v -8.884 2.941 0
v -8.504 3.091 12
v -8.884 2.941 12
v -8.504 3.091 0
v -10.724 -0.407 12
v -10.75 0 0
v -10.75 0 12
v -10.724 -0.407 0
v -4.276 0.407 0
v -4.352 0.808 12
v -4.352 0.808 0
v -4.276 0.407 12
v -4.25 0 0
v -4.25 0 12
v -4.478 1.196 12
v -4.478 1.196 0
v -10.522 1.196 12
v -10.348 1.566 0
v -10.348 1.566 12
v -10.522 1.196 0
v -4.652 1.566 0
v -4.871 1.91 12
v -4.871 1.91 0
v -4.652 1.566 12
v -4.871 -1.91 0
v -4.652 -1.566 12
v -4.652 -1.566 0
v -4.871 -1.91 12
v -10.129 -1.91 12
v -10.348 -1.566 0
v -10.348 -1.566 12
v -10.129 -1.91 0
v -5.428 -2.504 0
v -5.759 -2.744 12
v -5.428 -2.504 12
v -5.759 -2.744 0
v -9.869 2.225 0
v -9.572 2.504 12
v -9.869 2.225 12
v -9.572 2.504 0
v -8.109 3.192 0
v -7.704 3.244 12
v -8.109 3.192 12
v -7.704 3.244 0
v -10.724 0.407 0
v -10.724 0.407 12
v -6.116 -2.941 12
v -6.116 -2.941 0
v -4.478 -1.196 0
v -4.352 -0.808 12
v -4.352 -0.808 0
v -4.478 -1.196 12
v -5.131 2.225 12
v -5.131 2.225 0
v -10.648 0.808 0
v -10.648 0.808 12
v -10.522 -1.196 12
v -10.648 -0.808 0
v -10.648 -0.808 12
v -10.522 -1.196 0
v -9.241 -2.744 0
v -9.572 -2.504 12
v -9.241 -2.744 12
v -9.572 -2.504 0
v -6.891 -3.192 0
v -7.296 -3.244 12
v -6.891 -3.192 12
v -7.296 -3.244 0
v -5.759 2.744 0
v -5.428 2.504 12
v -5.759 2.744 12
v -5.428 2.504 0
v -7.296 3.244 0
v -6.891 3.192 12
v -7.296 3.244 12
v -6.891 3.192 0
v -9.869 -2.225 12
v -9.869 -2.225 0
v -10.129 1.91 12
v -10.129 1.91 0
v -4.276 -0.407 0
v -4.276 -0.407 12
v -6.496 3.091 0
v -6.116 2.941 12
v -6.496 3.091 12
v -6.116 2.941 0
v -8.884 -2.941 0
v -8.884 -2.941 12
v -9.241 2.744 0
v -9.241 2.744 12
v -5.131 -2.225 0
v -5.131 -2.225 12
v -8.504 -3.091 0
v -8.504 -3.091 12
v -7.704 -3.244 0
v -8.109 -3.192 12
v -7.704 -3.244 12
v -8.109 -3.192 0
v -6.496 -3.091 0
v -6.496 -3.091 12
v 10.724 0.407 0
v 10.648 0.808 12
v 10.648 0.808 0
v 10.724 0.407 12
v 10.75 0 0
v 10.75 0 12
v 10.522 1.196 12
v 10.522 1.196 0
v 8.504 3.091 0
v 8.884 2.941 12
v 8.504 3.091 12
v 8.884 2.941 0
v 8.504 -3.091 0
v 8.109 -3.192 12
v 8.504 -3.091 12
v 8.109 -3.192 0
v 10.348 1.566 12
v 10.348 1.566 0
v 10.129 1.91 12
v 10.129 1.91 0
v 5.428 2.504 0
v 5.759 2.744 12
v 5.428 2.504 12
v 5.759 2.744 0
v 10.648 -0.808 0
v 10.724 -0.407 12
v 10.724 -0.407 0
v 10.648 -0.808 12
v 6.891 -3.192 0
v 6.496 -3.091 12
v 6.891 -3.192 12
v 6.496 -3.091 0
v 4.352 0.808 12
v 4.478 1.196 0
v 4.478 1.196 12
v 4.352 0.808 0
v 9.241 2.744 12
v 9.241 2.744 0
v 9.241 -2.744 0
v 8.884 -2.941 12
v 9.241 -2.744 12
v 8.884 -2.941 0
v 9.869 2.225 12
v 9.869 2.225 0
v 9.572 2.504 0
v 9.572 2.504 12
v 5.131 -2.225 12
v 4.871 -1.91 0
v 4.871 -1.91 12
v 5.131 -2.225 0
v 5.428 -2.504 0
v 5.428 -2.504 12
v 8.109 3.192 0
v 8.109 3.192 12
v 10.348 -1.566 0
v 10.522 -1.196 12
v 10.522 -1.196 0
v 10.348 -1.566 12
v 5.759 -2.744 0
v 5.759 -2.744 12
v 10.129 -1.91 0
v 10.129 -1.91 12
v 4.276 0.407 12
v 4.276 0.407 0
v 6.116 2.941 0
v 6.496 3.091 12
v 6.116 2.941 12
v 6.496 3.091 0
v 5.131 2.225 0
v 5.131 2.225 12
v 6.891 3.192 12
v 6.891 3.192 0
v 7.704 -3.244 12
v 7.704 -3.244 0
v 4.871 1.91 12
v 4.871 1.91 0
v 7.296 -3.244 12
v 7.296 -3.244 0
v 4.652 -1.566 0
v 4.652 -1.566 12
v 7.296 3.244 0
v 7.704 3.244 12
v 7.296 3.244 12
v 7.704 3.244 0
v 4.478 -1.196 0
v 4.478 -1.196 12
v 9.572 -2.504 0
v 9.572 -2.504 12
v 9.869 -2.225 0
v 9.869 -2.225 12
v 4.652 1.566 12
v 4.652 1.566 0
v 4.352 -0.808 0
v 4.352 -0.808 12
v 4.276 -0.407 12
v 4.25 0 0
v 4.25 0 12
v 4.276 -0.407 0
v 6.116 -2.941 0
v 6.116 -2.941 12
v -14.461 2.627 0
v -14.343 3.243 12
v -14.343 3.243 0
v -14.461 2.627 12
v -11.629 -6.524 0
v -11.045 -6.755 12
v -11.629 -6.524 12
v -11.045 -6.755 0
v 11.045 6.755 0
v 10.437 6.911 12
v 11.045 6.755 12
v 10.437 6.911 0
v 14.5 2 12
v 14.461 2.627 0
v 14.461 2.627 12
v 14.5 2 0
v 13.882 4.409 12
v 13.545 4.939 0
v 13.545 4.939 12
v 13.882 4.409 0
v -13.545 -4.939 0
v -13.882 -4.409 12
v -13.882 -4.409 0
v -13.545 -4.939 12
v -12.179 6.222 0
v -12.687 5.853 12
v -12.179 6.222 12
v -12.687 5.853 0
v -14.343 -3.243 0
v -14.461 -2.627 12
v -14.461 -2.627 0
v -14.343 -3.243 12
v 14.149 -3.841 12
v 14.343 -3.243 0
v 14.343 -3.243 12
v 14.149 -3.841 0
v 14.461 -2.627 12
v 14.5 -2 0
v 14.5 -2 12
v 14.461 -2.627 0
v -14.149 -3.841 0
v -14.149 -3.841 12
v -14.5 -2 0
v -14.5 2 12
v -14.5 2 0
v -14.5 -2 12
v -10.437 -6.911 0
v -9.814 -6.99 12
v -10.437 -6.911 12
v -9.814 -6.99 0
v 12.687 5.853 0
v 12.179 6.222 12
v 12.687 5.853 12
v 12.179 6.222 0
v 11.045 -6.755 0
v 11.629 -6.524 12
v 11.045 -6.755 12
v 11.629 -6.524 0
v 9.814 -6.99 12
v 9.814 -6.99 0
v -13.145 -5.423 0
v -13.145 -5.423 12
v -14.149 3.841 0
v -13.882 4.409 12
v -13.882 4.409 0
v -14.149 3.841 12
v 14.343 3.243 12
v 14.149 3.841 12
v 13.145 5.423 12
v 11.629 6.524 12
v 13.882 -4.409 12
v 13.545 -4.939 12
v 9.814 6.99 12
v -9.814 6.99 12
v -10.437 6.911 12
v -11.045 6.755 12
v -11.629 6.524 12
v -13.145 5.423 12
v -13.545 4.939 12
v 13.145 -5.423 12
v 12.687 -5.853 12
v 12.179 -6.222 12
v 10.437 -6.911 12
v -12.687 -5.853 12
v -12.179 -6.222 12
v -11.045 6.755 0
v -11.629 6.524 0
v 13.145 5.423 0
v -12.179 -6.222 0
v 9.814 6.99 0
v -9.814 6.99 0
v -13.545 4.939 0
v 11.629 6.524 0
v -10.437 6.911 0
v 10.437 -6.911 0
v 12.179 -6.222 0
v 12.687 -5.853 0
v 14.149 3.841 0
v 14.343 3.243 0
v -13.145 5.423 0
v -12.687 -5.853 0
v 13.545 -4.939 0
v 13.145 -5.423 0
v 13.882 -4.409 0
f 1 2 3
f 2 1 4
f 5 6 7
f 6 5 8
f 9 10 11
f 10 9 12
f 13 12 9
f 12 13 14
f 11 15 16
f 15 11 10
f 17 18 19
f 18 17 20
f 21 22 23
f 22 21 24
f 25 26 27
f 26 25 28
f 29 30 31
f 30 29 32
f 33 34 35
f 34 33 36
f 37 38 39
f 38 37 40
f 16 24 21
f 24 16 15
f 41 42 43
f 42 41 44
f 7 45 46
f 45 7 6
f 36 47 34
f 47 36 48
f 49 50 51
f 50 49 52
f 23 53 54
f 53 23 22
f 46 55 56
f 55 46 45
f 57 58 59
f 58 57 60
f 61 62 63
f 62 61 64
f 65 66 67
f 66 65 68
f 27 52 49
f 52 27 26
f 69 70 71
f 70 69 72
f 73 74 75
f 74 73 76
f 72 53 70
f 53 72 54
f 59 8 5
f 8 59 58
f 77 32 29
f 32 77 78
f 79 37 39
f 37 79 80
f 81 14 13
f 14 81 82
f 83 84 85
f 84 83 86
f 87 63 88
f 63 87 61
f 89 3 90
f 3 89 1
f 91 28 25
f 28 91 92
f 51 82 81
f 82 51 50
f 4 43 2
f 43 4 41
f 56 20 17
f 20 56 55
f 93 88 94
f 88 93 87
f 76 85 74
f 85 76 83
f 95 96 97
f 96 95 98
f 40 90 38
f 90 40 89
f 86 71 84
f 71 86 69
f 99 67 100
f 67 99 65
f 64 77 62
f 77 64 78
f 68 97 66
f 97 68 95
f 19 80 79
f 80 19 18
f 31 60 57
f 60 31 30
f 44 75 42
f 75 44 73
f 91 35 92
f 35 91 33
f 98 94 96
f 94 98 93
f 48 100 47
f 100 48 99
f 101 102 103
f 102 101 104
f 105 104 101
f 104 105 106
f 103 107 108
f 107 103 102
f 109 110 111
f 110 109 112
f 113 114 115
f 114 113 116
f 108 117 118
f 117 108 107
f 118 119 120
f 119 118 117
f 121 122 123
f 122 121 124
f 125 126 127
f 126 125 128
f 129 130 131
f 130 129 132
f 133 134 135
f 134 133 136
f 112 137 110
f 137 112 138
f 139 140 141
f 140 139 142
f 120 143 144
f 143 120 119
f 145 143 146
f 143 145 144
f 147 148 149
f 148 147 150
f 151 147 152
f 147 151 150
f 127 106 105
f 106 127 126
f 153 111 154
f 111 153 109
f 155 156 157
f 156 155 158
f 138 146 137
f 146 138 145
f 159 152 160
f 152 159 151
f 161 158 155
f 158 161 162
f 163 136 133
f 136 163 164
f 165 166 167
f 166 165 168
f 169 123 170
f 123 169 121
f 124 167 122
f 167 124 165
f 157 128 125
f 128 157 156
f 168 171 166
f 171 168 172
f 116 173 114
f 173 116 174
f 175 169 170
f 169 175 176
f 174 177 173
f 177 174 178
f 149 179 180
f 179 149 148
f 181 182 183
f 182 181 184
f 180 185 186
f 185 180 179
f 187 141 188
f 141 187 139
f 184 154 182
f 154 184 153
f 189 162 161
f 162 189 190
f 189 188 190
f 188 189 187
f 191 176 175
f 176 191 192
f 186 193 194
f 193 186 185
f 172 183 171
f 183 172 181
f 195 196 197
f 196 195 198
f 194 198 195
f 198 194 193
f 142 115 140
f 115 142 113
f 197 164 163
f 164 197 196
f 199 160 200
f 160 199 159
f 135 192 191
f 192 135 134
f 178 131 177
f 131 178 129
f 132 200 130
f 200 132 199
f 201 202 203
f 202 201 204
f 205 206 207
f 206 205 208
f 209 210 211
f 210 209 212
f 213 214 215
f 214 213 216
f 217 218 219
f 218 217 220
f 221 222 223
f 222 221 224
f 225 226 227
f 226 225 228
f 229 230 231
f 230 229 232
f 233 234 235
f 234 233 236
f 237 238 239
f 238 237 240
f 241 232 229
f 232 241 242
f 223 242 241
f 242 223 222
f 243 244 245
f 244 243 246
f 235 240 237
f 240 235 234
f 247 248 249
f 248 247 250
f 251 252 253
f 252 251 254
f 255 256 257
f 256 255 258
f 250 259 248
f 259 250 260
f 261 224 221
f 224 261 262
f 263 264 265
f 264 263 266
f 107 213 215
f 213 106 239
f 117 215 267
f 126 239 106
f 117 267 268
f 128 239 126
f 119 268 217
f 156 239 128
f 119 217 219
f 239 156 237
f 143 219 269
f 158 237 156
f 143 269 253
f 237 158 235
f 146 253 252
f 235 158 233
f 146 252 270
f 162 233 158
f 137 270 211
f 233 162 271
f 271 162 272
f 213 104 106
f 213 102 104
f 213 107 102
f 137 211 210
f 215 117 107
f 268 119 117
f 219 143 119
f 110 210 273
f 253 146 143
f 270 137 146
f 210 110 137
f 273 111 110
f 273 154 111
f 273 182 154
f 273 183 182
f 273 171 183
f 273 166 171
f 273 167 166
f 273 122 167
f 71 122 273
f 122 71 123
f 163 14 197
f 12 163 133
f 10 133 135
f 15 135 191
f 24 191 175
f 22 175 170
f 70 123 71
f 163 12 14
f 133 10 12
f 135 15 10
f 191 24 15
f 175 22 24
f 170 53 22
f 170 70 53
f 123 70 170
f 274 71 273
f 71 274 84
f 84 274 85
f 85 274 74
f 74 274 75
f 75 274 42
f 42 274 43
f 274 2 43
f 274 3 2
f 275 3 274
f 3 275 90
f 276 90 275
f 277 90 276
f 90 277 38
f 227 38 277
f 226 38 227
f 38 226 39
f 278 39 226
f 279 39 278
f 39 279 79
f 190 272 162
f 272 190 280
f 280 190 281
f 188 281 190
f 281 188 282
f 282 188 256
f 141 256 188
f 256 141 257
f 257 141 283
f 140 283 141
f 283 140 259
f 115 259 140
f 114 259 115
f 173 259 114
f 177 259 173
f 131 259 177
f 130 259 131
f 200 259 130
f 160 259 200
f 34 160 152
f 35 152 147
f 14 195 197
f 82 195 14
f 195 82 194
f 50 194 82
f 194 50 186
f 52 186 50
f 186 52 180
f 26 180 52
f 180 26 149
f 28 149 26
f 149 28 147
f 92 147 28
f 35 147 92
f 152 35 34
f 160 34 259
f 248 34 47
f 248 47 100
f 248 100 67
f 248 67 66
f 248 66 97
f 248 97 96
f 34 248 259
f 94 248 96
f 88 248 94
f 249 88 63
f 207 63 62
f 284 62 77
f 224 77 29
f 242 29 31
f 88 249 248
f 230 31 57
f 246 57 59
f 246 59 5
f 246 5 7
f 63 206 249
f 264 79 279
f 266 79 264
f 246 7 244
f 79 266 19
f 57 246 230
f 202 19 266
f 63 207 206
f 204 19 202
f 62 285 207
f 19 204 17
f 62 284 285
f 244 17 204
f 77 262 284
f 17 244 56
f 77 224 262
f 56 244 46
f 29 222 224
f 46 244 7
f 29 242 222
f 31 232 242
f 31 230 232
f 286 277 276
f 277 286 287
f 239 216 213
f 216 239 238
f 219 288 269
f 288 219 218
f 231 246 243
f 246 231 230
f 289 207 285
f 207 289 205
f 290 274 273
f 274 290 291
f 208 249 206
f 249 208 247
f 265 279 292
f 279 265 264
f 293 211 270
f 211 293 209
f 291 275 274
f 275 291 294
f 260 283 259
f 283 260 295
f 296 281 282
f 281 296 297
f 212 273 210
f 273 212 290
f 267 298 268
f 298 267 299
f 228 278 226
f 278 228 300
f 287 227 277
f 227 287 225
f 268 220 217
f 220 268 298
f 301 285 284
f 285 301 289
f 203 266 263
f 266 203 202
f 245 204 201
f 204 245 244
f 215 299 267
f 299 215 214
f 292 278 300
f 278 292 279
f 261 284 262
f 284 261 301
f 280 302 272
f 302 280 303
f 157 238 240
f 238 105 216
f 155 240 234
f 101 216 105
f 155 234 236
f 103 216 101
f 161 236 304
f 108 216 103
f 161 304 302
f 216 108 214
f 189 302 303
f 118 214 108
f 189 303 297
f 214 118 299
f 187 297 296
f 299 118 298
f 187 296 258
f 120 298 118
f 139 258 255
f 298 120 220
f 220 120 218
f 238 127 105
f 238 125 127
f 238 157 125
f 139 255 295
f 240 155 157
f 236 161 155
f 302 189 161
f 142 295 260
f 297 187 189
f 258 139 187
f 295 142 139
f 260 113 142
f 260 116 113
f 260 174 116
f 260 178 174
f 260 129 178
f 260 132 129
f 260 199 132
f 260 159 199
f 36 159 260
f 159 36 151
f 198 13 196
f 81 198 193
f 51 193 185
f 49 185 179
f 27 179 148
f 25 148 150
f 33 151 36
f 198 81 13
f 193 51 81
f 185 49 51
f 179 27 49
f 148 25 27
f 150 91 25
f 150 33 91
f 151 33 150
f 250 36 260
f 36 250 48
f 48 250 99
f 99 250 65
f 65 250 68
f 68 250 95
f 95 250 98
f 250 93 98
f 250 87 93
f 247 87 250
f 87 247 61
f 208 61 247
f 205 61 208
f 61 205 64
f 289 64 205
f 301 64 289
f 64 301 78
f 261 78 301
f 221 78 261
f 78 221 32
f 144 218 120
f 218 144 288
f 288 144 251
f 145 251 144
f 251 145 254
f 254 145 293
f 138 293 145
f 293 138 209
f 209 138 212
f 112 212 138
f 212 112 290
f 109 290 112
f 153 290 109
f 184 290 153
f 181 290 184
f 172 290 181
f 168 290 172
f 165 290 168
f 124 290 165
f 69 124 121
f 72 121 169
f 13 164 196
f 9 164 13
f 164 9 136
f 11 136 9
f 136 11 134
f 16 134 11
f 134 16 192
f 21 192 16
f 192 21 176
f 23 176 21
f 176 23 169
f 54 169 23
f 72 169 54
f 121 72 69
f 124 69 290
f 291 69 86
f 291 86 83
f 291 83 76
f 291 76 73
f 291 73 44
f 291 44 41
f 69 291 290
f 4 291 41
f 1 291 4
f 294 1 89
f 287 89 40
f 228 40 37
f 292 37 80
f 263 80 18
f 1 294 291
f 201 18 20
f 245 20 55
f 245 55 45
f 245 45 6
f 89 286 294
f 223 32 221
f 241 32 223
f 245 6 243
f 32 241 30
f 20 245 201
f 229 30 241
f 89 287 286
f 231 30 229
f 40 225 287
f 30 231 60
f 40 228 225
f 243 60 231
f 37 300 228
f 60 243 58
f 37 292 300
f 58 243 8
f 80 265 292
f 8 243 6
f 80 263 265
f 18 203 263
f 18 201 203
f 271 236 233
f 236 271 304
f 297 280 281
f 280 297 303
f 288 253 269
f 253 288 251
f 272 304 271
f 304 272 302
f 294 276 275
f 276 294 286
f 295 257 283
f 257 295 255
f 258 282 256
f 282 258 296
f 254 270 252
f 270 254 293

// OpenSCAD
$fn = 50;


difference() {
	union() {
		hull() {
			translate(v = [-9.5000000000, 2.0000000000, 0]) {
				cylinder(h = 12, r = 5);
			}
			translate(v = [9.5000000000, 2.0000000000, 0]) {
				cylinder(h = 12, r = 5);
			}
			translate(v = [-9.5000000000, -2.0000000000, 0]) {
				cylinder(h = 12, r = 5);
			}
			translate(v = [9.5000000000, -2.0000000000, 0]) {
				cylinder(h = 12, r = 5);
			}
		}
	}
	union() {
		translate(v = [-7.5000000000, 0.0000000000, -100.0000000000]) {
			cylinder(h = 200, r = 3.2500000000);
		}
		translate(v = [7.5000000000, 0.0000000000, -100.0000000000]) {
			cylinder(h = 200, r = 3.2500000000);
		}
	}
}
